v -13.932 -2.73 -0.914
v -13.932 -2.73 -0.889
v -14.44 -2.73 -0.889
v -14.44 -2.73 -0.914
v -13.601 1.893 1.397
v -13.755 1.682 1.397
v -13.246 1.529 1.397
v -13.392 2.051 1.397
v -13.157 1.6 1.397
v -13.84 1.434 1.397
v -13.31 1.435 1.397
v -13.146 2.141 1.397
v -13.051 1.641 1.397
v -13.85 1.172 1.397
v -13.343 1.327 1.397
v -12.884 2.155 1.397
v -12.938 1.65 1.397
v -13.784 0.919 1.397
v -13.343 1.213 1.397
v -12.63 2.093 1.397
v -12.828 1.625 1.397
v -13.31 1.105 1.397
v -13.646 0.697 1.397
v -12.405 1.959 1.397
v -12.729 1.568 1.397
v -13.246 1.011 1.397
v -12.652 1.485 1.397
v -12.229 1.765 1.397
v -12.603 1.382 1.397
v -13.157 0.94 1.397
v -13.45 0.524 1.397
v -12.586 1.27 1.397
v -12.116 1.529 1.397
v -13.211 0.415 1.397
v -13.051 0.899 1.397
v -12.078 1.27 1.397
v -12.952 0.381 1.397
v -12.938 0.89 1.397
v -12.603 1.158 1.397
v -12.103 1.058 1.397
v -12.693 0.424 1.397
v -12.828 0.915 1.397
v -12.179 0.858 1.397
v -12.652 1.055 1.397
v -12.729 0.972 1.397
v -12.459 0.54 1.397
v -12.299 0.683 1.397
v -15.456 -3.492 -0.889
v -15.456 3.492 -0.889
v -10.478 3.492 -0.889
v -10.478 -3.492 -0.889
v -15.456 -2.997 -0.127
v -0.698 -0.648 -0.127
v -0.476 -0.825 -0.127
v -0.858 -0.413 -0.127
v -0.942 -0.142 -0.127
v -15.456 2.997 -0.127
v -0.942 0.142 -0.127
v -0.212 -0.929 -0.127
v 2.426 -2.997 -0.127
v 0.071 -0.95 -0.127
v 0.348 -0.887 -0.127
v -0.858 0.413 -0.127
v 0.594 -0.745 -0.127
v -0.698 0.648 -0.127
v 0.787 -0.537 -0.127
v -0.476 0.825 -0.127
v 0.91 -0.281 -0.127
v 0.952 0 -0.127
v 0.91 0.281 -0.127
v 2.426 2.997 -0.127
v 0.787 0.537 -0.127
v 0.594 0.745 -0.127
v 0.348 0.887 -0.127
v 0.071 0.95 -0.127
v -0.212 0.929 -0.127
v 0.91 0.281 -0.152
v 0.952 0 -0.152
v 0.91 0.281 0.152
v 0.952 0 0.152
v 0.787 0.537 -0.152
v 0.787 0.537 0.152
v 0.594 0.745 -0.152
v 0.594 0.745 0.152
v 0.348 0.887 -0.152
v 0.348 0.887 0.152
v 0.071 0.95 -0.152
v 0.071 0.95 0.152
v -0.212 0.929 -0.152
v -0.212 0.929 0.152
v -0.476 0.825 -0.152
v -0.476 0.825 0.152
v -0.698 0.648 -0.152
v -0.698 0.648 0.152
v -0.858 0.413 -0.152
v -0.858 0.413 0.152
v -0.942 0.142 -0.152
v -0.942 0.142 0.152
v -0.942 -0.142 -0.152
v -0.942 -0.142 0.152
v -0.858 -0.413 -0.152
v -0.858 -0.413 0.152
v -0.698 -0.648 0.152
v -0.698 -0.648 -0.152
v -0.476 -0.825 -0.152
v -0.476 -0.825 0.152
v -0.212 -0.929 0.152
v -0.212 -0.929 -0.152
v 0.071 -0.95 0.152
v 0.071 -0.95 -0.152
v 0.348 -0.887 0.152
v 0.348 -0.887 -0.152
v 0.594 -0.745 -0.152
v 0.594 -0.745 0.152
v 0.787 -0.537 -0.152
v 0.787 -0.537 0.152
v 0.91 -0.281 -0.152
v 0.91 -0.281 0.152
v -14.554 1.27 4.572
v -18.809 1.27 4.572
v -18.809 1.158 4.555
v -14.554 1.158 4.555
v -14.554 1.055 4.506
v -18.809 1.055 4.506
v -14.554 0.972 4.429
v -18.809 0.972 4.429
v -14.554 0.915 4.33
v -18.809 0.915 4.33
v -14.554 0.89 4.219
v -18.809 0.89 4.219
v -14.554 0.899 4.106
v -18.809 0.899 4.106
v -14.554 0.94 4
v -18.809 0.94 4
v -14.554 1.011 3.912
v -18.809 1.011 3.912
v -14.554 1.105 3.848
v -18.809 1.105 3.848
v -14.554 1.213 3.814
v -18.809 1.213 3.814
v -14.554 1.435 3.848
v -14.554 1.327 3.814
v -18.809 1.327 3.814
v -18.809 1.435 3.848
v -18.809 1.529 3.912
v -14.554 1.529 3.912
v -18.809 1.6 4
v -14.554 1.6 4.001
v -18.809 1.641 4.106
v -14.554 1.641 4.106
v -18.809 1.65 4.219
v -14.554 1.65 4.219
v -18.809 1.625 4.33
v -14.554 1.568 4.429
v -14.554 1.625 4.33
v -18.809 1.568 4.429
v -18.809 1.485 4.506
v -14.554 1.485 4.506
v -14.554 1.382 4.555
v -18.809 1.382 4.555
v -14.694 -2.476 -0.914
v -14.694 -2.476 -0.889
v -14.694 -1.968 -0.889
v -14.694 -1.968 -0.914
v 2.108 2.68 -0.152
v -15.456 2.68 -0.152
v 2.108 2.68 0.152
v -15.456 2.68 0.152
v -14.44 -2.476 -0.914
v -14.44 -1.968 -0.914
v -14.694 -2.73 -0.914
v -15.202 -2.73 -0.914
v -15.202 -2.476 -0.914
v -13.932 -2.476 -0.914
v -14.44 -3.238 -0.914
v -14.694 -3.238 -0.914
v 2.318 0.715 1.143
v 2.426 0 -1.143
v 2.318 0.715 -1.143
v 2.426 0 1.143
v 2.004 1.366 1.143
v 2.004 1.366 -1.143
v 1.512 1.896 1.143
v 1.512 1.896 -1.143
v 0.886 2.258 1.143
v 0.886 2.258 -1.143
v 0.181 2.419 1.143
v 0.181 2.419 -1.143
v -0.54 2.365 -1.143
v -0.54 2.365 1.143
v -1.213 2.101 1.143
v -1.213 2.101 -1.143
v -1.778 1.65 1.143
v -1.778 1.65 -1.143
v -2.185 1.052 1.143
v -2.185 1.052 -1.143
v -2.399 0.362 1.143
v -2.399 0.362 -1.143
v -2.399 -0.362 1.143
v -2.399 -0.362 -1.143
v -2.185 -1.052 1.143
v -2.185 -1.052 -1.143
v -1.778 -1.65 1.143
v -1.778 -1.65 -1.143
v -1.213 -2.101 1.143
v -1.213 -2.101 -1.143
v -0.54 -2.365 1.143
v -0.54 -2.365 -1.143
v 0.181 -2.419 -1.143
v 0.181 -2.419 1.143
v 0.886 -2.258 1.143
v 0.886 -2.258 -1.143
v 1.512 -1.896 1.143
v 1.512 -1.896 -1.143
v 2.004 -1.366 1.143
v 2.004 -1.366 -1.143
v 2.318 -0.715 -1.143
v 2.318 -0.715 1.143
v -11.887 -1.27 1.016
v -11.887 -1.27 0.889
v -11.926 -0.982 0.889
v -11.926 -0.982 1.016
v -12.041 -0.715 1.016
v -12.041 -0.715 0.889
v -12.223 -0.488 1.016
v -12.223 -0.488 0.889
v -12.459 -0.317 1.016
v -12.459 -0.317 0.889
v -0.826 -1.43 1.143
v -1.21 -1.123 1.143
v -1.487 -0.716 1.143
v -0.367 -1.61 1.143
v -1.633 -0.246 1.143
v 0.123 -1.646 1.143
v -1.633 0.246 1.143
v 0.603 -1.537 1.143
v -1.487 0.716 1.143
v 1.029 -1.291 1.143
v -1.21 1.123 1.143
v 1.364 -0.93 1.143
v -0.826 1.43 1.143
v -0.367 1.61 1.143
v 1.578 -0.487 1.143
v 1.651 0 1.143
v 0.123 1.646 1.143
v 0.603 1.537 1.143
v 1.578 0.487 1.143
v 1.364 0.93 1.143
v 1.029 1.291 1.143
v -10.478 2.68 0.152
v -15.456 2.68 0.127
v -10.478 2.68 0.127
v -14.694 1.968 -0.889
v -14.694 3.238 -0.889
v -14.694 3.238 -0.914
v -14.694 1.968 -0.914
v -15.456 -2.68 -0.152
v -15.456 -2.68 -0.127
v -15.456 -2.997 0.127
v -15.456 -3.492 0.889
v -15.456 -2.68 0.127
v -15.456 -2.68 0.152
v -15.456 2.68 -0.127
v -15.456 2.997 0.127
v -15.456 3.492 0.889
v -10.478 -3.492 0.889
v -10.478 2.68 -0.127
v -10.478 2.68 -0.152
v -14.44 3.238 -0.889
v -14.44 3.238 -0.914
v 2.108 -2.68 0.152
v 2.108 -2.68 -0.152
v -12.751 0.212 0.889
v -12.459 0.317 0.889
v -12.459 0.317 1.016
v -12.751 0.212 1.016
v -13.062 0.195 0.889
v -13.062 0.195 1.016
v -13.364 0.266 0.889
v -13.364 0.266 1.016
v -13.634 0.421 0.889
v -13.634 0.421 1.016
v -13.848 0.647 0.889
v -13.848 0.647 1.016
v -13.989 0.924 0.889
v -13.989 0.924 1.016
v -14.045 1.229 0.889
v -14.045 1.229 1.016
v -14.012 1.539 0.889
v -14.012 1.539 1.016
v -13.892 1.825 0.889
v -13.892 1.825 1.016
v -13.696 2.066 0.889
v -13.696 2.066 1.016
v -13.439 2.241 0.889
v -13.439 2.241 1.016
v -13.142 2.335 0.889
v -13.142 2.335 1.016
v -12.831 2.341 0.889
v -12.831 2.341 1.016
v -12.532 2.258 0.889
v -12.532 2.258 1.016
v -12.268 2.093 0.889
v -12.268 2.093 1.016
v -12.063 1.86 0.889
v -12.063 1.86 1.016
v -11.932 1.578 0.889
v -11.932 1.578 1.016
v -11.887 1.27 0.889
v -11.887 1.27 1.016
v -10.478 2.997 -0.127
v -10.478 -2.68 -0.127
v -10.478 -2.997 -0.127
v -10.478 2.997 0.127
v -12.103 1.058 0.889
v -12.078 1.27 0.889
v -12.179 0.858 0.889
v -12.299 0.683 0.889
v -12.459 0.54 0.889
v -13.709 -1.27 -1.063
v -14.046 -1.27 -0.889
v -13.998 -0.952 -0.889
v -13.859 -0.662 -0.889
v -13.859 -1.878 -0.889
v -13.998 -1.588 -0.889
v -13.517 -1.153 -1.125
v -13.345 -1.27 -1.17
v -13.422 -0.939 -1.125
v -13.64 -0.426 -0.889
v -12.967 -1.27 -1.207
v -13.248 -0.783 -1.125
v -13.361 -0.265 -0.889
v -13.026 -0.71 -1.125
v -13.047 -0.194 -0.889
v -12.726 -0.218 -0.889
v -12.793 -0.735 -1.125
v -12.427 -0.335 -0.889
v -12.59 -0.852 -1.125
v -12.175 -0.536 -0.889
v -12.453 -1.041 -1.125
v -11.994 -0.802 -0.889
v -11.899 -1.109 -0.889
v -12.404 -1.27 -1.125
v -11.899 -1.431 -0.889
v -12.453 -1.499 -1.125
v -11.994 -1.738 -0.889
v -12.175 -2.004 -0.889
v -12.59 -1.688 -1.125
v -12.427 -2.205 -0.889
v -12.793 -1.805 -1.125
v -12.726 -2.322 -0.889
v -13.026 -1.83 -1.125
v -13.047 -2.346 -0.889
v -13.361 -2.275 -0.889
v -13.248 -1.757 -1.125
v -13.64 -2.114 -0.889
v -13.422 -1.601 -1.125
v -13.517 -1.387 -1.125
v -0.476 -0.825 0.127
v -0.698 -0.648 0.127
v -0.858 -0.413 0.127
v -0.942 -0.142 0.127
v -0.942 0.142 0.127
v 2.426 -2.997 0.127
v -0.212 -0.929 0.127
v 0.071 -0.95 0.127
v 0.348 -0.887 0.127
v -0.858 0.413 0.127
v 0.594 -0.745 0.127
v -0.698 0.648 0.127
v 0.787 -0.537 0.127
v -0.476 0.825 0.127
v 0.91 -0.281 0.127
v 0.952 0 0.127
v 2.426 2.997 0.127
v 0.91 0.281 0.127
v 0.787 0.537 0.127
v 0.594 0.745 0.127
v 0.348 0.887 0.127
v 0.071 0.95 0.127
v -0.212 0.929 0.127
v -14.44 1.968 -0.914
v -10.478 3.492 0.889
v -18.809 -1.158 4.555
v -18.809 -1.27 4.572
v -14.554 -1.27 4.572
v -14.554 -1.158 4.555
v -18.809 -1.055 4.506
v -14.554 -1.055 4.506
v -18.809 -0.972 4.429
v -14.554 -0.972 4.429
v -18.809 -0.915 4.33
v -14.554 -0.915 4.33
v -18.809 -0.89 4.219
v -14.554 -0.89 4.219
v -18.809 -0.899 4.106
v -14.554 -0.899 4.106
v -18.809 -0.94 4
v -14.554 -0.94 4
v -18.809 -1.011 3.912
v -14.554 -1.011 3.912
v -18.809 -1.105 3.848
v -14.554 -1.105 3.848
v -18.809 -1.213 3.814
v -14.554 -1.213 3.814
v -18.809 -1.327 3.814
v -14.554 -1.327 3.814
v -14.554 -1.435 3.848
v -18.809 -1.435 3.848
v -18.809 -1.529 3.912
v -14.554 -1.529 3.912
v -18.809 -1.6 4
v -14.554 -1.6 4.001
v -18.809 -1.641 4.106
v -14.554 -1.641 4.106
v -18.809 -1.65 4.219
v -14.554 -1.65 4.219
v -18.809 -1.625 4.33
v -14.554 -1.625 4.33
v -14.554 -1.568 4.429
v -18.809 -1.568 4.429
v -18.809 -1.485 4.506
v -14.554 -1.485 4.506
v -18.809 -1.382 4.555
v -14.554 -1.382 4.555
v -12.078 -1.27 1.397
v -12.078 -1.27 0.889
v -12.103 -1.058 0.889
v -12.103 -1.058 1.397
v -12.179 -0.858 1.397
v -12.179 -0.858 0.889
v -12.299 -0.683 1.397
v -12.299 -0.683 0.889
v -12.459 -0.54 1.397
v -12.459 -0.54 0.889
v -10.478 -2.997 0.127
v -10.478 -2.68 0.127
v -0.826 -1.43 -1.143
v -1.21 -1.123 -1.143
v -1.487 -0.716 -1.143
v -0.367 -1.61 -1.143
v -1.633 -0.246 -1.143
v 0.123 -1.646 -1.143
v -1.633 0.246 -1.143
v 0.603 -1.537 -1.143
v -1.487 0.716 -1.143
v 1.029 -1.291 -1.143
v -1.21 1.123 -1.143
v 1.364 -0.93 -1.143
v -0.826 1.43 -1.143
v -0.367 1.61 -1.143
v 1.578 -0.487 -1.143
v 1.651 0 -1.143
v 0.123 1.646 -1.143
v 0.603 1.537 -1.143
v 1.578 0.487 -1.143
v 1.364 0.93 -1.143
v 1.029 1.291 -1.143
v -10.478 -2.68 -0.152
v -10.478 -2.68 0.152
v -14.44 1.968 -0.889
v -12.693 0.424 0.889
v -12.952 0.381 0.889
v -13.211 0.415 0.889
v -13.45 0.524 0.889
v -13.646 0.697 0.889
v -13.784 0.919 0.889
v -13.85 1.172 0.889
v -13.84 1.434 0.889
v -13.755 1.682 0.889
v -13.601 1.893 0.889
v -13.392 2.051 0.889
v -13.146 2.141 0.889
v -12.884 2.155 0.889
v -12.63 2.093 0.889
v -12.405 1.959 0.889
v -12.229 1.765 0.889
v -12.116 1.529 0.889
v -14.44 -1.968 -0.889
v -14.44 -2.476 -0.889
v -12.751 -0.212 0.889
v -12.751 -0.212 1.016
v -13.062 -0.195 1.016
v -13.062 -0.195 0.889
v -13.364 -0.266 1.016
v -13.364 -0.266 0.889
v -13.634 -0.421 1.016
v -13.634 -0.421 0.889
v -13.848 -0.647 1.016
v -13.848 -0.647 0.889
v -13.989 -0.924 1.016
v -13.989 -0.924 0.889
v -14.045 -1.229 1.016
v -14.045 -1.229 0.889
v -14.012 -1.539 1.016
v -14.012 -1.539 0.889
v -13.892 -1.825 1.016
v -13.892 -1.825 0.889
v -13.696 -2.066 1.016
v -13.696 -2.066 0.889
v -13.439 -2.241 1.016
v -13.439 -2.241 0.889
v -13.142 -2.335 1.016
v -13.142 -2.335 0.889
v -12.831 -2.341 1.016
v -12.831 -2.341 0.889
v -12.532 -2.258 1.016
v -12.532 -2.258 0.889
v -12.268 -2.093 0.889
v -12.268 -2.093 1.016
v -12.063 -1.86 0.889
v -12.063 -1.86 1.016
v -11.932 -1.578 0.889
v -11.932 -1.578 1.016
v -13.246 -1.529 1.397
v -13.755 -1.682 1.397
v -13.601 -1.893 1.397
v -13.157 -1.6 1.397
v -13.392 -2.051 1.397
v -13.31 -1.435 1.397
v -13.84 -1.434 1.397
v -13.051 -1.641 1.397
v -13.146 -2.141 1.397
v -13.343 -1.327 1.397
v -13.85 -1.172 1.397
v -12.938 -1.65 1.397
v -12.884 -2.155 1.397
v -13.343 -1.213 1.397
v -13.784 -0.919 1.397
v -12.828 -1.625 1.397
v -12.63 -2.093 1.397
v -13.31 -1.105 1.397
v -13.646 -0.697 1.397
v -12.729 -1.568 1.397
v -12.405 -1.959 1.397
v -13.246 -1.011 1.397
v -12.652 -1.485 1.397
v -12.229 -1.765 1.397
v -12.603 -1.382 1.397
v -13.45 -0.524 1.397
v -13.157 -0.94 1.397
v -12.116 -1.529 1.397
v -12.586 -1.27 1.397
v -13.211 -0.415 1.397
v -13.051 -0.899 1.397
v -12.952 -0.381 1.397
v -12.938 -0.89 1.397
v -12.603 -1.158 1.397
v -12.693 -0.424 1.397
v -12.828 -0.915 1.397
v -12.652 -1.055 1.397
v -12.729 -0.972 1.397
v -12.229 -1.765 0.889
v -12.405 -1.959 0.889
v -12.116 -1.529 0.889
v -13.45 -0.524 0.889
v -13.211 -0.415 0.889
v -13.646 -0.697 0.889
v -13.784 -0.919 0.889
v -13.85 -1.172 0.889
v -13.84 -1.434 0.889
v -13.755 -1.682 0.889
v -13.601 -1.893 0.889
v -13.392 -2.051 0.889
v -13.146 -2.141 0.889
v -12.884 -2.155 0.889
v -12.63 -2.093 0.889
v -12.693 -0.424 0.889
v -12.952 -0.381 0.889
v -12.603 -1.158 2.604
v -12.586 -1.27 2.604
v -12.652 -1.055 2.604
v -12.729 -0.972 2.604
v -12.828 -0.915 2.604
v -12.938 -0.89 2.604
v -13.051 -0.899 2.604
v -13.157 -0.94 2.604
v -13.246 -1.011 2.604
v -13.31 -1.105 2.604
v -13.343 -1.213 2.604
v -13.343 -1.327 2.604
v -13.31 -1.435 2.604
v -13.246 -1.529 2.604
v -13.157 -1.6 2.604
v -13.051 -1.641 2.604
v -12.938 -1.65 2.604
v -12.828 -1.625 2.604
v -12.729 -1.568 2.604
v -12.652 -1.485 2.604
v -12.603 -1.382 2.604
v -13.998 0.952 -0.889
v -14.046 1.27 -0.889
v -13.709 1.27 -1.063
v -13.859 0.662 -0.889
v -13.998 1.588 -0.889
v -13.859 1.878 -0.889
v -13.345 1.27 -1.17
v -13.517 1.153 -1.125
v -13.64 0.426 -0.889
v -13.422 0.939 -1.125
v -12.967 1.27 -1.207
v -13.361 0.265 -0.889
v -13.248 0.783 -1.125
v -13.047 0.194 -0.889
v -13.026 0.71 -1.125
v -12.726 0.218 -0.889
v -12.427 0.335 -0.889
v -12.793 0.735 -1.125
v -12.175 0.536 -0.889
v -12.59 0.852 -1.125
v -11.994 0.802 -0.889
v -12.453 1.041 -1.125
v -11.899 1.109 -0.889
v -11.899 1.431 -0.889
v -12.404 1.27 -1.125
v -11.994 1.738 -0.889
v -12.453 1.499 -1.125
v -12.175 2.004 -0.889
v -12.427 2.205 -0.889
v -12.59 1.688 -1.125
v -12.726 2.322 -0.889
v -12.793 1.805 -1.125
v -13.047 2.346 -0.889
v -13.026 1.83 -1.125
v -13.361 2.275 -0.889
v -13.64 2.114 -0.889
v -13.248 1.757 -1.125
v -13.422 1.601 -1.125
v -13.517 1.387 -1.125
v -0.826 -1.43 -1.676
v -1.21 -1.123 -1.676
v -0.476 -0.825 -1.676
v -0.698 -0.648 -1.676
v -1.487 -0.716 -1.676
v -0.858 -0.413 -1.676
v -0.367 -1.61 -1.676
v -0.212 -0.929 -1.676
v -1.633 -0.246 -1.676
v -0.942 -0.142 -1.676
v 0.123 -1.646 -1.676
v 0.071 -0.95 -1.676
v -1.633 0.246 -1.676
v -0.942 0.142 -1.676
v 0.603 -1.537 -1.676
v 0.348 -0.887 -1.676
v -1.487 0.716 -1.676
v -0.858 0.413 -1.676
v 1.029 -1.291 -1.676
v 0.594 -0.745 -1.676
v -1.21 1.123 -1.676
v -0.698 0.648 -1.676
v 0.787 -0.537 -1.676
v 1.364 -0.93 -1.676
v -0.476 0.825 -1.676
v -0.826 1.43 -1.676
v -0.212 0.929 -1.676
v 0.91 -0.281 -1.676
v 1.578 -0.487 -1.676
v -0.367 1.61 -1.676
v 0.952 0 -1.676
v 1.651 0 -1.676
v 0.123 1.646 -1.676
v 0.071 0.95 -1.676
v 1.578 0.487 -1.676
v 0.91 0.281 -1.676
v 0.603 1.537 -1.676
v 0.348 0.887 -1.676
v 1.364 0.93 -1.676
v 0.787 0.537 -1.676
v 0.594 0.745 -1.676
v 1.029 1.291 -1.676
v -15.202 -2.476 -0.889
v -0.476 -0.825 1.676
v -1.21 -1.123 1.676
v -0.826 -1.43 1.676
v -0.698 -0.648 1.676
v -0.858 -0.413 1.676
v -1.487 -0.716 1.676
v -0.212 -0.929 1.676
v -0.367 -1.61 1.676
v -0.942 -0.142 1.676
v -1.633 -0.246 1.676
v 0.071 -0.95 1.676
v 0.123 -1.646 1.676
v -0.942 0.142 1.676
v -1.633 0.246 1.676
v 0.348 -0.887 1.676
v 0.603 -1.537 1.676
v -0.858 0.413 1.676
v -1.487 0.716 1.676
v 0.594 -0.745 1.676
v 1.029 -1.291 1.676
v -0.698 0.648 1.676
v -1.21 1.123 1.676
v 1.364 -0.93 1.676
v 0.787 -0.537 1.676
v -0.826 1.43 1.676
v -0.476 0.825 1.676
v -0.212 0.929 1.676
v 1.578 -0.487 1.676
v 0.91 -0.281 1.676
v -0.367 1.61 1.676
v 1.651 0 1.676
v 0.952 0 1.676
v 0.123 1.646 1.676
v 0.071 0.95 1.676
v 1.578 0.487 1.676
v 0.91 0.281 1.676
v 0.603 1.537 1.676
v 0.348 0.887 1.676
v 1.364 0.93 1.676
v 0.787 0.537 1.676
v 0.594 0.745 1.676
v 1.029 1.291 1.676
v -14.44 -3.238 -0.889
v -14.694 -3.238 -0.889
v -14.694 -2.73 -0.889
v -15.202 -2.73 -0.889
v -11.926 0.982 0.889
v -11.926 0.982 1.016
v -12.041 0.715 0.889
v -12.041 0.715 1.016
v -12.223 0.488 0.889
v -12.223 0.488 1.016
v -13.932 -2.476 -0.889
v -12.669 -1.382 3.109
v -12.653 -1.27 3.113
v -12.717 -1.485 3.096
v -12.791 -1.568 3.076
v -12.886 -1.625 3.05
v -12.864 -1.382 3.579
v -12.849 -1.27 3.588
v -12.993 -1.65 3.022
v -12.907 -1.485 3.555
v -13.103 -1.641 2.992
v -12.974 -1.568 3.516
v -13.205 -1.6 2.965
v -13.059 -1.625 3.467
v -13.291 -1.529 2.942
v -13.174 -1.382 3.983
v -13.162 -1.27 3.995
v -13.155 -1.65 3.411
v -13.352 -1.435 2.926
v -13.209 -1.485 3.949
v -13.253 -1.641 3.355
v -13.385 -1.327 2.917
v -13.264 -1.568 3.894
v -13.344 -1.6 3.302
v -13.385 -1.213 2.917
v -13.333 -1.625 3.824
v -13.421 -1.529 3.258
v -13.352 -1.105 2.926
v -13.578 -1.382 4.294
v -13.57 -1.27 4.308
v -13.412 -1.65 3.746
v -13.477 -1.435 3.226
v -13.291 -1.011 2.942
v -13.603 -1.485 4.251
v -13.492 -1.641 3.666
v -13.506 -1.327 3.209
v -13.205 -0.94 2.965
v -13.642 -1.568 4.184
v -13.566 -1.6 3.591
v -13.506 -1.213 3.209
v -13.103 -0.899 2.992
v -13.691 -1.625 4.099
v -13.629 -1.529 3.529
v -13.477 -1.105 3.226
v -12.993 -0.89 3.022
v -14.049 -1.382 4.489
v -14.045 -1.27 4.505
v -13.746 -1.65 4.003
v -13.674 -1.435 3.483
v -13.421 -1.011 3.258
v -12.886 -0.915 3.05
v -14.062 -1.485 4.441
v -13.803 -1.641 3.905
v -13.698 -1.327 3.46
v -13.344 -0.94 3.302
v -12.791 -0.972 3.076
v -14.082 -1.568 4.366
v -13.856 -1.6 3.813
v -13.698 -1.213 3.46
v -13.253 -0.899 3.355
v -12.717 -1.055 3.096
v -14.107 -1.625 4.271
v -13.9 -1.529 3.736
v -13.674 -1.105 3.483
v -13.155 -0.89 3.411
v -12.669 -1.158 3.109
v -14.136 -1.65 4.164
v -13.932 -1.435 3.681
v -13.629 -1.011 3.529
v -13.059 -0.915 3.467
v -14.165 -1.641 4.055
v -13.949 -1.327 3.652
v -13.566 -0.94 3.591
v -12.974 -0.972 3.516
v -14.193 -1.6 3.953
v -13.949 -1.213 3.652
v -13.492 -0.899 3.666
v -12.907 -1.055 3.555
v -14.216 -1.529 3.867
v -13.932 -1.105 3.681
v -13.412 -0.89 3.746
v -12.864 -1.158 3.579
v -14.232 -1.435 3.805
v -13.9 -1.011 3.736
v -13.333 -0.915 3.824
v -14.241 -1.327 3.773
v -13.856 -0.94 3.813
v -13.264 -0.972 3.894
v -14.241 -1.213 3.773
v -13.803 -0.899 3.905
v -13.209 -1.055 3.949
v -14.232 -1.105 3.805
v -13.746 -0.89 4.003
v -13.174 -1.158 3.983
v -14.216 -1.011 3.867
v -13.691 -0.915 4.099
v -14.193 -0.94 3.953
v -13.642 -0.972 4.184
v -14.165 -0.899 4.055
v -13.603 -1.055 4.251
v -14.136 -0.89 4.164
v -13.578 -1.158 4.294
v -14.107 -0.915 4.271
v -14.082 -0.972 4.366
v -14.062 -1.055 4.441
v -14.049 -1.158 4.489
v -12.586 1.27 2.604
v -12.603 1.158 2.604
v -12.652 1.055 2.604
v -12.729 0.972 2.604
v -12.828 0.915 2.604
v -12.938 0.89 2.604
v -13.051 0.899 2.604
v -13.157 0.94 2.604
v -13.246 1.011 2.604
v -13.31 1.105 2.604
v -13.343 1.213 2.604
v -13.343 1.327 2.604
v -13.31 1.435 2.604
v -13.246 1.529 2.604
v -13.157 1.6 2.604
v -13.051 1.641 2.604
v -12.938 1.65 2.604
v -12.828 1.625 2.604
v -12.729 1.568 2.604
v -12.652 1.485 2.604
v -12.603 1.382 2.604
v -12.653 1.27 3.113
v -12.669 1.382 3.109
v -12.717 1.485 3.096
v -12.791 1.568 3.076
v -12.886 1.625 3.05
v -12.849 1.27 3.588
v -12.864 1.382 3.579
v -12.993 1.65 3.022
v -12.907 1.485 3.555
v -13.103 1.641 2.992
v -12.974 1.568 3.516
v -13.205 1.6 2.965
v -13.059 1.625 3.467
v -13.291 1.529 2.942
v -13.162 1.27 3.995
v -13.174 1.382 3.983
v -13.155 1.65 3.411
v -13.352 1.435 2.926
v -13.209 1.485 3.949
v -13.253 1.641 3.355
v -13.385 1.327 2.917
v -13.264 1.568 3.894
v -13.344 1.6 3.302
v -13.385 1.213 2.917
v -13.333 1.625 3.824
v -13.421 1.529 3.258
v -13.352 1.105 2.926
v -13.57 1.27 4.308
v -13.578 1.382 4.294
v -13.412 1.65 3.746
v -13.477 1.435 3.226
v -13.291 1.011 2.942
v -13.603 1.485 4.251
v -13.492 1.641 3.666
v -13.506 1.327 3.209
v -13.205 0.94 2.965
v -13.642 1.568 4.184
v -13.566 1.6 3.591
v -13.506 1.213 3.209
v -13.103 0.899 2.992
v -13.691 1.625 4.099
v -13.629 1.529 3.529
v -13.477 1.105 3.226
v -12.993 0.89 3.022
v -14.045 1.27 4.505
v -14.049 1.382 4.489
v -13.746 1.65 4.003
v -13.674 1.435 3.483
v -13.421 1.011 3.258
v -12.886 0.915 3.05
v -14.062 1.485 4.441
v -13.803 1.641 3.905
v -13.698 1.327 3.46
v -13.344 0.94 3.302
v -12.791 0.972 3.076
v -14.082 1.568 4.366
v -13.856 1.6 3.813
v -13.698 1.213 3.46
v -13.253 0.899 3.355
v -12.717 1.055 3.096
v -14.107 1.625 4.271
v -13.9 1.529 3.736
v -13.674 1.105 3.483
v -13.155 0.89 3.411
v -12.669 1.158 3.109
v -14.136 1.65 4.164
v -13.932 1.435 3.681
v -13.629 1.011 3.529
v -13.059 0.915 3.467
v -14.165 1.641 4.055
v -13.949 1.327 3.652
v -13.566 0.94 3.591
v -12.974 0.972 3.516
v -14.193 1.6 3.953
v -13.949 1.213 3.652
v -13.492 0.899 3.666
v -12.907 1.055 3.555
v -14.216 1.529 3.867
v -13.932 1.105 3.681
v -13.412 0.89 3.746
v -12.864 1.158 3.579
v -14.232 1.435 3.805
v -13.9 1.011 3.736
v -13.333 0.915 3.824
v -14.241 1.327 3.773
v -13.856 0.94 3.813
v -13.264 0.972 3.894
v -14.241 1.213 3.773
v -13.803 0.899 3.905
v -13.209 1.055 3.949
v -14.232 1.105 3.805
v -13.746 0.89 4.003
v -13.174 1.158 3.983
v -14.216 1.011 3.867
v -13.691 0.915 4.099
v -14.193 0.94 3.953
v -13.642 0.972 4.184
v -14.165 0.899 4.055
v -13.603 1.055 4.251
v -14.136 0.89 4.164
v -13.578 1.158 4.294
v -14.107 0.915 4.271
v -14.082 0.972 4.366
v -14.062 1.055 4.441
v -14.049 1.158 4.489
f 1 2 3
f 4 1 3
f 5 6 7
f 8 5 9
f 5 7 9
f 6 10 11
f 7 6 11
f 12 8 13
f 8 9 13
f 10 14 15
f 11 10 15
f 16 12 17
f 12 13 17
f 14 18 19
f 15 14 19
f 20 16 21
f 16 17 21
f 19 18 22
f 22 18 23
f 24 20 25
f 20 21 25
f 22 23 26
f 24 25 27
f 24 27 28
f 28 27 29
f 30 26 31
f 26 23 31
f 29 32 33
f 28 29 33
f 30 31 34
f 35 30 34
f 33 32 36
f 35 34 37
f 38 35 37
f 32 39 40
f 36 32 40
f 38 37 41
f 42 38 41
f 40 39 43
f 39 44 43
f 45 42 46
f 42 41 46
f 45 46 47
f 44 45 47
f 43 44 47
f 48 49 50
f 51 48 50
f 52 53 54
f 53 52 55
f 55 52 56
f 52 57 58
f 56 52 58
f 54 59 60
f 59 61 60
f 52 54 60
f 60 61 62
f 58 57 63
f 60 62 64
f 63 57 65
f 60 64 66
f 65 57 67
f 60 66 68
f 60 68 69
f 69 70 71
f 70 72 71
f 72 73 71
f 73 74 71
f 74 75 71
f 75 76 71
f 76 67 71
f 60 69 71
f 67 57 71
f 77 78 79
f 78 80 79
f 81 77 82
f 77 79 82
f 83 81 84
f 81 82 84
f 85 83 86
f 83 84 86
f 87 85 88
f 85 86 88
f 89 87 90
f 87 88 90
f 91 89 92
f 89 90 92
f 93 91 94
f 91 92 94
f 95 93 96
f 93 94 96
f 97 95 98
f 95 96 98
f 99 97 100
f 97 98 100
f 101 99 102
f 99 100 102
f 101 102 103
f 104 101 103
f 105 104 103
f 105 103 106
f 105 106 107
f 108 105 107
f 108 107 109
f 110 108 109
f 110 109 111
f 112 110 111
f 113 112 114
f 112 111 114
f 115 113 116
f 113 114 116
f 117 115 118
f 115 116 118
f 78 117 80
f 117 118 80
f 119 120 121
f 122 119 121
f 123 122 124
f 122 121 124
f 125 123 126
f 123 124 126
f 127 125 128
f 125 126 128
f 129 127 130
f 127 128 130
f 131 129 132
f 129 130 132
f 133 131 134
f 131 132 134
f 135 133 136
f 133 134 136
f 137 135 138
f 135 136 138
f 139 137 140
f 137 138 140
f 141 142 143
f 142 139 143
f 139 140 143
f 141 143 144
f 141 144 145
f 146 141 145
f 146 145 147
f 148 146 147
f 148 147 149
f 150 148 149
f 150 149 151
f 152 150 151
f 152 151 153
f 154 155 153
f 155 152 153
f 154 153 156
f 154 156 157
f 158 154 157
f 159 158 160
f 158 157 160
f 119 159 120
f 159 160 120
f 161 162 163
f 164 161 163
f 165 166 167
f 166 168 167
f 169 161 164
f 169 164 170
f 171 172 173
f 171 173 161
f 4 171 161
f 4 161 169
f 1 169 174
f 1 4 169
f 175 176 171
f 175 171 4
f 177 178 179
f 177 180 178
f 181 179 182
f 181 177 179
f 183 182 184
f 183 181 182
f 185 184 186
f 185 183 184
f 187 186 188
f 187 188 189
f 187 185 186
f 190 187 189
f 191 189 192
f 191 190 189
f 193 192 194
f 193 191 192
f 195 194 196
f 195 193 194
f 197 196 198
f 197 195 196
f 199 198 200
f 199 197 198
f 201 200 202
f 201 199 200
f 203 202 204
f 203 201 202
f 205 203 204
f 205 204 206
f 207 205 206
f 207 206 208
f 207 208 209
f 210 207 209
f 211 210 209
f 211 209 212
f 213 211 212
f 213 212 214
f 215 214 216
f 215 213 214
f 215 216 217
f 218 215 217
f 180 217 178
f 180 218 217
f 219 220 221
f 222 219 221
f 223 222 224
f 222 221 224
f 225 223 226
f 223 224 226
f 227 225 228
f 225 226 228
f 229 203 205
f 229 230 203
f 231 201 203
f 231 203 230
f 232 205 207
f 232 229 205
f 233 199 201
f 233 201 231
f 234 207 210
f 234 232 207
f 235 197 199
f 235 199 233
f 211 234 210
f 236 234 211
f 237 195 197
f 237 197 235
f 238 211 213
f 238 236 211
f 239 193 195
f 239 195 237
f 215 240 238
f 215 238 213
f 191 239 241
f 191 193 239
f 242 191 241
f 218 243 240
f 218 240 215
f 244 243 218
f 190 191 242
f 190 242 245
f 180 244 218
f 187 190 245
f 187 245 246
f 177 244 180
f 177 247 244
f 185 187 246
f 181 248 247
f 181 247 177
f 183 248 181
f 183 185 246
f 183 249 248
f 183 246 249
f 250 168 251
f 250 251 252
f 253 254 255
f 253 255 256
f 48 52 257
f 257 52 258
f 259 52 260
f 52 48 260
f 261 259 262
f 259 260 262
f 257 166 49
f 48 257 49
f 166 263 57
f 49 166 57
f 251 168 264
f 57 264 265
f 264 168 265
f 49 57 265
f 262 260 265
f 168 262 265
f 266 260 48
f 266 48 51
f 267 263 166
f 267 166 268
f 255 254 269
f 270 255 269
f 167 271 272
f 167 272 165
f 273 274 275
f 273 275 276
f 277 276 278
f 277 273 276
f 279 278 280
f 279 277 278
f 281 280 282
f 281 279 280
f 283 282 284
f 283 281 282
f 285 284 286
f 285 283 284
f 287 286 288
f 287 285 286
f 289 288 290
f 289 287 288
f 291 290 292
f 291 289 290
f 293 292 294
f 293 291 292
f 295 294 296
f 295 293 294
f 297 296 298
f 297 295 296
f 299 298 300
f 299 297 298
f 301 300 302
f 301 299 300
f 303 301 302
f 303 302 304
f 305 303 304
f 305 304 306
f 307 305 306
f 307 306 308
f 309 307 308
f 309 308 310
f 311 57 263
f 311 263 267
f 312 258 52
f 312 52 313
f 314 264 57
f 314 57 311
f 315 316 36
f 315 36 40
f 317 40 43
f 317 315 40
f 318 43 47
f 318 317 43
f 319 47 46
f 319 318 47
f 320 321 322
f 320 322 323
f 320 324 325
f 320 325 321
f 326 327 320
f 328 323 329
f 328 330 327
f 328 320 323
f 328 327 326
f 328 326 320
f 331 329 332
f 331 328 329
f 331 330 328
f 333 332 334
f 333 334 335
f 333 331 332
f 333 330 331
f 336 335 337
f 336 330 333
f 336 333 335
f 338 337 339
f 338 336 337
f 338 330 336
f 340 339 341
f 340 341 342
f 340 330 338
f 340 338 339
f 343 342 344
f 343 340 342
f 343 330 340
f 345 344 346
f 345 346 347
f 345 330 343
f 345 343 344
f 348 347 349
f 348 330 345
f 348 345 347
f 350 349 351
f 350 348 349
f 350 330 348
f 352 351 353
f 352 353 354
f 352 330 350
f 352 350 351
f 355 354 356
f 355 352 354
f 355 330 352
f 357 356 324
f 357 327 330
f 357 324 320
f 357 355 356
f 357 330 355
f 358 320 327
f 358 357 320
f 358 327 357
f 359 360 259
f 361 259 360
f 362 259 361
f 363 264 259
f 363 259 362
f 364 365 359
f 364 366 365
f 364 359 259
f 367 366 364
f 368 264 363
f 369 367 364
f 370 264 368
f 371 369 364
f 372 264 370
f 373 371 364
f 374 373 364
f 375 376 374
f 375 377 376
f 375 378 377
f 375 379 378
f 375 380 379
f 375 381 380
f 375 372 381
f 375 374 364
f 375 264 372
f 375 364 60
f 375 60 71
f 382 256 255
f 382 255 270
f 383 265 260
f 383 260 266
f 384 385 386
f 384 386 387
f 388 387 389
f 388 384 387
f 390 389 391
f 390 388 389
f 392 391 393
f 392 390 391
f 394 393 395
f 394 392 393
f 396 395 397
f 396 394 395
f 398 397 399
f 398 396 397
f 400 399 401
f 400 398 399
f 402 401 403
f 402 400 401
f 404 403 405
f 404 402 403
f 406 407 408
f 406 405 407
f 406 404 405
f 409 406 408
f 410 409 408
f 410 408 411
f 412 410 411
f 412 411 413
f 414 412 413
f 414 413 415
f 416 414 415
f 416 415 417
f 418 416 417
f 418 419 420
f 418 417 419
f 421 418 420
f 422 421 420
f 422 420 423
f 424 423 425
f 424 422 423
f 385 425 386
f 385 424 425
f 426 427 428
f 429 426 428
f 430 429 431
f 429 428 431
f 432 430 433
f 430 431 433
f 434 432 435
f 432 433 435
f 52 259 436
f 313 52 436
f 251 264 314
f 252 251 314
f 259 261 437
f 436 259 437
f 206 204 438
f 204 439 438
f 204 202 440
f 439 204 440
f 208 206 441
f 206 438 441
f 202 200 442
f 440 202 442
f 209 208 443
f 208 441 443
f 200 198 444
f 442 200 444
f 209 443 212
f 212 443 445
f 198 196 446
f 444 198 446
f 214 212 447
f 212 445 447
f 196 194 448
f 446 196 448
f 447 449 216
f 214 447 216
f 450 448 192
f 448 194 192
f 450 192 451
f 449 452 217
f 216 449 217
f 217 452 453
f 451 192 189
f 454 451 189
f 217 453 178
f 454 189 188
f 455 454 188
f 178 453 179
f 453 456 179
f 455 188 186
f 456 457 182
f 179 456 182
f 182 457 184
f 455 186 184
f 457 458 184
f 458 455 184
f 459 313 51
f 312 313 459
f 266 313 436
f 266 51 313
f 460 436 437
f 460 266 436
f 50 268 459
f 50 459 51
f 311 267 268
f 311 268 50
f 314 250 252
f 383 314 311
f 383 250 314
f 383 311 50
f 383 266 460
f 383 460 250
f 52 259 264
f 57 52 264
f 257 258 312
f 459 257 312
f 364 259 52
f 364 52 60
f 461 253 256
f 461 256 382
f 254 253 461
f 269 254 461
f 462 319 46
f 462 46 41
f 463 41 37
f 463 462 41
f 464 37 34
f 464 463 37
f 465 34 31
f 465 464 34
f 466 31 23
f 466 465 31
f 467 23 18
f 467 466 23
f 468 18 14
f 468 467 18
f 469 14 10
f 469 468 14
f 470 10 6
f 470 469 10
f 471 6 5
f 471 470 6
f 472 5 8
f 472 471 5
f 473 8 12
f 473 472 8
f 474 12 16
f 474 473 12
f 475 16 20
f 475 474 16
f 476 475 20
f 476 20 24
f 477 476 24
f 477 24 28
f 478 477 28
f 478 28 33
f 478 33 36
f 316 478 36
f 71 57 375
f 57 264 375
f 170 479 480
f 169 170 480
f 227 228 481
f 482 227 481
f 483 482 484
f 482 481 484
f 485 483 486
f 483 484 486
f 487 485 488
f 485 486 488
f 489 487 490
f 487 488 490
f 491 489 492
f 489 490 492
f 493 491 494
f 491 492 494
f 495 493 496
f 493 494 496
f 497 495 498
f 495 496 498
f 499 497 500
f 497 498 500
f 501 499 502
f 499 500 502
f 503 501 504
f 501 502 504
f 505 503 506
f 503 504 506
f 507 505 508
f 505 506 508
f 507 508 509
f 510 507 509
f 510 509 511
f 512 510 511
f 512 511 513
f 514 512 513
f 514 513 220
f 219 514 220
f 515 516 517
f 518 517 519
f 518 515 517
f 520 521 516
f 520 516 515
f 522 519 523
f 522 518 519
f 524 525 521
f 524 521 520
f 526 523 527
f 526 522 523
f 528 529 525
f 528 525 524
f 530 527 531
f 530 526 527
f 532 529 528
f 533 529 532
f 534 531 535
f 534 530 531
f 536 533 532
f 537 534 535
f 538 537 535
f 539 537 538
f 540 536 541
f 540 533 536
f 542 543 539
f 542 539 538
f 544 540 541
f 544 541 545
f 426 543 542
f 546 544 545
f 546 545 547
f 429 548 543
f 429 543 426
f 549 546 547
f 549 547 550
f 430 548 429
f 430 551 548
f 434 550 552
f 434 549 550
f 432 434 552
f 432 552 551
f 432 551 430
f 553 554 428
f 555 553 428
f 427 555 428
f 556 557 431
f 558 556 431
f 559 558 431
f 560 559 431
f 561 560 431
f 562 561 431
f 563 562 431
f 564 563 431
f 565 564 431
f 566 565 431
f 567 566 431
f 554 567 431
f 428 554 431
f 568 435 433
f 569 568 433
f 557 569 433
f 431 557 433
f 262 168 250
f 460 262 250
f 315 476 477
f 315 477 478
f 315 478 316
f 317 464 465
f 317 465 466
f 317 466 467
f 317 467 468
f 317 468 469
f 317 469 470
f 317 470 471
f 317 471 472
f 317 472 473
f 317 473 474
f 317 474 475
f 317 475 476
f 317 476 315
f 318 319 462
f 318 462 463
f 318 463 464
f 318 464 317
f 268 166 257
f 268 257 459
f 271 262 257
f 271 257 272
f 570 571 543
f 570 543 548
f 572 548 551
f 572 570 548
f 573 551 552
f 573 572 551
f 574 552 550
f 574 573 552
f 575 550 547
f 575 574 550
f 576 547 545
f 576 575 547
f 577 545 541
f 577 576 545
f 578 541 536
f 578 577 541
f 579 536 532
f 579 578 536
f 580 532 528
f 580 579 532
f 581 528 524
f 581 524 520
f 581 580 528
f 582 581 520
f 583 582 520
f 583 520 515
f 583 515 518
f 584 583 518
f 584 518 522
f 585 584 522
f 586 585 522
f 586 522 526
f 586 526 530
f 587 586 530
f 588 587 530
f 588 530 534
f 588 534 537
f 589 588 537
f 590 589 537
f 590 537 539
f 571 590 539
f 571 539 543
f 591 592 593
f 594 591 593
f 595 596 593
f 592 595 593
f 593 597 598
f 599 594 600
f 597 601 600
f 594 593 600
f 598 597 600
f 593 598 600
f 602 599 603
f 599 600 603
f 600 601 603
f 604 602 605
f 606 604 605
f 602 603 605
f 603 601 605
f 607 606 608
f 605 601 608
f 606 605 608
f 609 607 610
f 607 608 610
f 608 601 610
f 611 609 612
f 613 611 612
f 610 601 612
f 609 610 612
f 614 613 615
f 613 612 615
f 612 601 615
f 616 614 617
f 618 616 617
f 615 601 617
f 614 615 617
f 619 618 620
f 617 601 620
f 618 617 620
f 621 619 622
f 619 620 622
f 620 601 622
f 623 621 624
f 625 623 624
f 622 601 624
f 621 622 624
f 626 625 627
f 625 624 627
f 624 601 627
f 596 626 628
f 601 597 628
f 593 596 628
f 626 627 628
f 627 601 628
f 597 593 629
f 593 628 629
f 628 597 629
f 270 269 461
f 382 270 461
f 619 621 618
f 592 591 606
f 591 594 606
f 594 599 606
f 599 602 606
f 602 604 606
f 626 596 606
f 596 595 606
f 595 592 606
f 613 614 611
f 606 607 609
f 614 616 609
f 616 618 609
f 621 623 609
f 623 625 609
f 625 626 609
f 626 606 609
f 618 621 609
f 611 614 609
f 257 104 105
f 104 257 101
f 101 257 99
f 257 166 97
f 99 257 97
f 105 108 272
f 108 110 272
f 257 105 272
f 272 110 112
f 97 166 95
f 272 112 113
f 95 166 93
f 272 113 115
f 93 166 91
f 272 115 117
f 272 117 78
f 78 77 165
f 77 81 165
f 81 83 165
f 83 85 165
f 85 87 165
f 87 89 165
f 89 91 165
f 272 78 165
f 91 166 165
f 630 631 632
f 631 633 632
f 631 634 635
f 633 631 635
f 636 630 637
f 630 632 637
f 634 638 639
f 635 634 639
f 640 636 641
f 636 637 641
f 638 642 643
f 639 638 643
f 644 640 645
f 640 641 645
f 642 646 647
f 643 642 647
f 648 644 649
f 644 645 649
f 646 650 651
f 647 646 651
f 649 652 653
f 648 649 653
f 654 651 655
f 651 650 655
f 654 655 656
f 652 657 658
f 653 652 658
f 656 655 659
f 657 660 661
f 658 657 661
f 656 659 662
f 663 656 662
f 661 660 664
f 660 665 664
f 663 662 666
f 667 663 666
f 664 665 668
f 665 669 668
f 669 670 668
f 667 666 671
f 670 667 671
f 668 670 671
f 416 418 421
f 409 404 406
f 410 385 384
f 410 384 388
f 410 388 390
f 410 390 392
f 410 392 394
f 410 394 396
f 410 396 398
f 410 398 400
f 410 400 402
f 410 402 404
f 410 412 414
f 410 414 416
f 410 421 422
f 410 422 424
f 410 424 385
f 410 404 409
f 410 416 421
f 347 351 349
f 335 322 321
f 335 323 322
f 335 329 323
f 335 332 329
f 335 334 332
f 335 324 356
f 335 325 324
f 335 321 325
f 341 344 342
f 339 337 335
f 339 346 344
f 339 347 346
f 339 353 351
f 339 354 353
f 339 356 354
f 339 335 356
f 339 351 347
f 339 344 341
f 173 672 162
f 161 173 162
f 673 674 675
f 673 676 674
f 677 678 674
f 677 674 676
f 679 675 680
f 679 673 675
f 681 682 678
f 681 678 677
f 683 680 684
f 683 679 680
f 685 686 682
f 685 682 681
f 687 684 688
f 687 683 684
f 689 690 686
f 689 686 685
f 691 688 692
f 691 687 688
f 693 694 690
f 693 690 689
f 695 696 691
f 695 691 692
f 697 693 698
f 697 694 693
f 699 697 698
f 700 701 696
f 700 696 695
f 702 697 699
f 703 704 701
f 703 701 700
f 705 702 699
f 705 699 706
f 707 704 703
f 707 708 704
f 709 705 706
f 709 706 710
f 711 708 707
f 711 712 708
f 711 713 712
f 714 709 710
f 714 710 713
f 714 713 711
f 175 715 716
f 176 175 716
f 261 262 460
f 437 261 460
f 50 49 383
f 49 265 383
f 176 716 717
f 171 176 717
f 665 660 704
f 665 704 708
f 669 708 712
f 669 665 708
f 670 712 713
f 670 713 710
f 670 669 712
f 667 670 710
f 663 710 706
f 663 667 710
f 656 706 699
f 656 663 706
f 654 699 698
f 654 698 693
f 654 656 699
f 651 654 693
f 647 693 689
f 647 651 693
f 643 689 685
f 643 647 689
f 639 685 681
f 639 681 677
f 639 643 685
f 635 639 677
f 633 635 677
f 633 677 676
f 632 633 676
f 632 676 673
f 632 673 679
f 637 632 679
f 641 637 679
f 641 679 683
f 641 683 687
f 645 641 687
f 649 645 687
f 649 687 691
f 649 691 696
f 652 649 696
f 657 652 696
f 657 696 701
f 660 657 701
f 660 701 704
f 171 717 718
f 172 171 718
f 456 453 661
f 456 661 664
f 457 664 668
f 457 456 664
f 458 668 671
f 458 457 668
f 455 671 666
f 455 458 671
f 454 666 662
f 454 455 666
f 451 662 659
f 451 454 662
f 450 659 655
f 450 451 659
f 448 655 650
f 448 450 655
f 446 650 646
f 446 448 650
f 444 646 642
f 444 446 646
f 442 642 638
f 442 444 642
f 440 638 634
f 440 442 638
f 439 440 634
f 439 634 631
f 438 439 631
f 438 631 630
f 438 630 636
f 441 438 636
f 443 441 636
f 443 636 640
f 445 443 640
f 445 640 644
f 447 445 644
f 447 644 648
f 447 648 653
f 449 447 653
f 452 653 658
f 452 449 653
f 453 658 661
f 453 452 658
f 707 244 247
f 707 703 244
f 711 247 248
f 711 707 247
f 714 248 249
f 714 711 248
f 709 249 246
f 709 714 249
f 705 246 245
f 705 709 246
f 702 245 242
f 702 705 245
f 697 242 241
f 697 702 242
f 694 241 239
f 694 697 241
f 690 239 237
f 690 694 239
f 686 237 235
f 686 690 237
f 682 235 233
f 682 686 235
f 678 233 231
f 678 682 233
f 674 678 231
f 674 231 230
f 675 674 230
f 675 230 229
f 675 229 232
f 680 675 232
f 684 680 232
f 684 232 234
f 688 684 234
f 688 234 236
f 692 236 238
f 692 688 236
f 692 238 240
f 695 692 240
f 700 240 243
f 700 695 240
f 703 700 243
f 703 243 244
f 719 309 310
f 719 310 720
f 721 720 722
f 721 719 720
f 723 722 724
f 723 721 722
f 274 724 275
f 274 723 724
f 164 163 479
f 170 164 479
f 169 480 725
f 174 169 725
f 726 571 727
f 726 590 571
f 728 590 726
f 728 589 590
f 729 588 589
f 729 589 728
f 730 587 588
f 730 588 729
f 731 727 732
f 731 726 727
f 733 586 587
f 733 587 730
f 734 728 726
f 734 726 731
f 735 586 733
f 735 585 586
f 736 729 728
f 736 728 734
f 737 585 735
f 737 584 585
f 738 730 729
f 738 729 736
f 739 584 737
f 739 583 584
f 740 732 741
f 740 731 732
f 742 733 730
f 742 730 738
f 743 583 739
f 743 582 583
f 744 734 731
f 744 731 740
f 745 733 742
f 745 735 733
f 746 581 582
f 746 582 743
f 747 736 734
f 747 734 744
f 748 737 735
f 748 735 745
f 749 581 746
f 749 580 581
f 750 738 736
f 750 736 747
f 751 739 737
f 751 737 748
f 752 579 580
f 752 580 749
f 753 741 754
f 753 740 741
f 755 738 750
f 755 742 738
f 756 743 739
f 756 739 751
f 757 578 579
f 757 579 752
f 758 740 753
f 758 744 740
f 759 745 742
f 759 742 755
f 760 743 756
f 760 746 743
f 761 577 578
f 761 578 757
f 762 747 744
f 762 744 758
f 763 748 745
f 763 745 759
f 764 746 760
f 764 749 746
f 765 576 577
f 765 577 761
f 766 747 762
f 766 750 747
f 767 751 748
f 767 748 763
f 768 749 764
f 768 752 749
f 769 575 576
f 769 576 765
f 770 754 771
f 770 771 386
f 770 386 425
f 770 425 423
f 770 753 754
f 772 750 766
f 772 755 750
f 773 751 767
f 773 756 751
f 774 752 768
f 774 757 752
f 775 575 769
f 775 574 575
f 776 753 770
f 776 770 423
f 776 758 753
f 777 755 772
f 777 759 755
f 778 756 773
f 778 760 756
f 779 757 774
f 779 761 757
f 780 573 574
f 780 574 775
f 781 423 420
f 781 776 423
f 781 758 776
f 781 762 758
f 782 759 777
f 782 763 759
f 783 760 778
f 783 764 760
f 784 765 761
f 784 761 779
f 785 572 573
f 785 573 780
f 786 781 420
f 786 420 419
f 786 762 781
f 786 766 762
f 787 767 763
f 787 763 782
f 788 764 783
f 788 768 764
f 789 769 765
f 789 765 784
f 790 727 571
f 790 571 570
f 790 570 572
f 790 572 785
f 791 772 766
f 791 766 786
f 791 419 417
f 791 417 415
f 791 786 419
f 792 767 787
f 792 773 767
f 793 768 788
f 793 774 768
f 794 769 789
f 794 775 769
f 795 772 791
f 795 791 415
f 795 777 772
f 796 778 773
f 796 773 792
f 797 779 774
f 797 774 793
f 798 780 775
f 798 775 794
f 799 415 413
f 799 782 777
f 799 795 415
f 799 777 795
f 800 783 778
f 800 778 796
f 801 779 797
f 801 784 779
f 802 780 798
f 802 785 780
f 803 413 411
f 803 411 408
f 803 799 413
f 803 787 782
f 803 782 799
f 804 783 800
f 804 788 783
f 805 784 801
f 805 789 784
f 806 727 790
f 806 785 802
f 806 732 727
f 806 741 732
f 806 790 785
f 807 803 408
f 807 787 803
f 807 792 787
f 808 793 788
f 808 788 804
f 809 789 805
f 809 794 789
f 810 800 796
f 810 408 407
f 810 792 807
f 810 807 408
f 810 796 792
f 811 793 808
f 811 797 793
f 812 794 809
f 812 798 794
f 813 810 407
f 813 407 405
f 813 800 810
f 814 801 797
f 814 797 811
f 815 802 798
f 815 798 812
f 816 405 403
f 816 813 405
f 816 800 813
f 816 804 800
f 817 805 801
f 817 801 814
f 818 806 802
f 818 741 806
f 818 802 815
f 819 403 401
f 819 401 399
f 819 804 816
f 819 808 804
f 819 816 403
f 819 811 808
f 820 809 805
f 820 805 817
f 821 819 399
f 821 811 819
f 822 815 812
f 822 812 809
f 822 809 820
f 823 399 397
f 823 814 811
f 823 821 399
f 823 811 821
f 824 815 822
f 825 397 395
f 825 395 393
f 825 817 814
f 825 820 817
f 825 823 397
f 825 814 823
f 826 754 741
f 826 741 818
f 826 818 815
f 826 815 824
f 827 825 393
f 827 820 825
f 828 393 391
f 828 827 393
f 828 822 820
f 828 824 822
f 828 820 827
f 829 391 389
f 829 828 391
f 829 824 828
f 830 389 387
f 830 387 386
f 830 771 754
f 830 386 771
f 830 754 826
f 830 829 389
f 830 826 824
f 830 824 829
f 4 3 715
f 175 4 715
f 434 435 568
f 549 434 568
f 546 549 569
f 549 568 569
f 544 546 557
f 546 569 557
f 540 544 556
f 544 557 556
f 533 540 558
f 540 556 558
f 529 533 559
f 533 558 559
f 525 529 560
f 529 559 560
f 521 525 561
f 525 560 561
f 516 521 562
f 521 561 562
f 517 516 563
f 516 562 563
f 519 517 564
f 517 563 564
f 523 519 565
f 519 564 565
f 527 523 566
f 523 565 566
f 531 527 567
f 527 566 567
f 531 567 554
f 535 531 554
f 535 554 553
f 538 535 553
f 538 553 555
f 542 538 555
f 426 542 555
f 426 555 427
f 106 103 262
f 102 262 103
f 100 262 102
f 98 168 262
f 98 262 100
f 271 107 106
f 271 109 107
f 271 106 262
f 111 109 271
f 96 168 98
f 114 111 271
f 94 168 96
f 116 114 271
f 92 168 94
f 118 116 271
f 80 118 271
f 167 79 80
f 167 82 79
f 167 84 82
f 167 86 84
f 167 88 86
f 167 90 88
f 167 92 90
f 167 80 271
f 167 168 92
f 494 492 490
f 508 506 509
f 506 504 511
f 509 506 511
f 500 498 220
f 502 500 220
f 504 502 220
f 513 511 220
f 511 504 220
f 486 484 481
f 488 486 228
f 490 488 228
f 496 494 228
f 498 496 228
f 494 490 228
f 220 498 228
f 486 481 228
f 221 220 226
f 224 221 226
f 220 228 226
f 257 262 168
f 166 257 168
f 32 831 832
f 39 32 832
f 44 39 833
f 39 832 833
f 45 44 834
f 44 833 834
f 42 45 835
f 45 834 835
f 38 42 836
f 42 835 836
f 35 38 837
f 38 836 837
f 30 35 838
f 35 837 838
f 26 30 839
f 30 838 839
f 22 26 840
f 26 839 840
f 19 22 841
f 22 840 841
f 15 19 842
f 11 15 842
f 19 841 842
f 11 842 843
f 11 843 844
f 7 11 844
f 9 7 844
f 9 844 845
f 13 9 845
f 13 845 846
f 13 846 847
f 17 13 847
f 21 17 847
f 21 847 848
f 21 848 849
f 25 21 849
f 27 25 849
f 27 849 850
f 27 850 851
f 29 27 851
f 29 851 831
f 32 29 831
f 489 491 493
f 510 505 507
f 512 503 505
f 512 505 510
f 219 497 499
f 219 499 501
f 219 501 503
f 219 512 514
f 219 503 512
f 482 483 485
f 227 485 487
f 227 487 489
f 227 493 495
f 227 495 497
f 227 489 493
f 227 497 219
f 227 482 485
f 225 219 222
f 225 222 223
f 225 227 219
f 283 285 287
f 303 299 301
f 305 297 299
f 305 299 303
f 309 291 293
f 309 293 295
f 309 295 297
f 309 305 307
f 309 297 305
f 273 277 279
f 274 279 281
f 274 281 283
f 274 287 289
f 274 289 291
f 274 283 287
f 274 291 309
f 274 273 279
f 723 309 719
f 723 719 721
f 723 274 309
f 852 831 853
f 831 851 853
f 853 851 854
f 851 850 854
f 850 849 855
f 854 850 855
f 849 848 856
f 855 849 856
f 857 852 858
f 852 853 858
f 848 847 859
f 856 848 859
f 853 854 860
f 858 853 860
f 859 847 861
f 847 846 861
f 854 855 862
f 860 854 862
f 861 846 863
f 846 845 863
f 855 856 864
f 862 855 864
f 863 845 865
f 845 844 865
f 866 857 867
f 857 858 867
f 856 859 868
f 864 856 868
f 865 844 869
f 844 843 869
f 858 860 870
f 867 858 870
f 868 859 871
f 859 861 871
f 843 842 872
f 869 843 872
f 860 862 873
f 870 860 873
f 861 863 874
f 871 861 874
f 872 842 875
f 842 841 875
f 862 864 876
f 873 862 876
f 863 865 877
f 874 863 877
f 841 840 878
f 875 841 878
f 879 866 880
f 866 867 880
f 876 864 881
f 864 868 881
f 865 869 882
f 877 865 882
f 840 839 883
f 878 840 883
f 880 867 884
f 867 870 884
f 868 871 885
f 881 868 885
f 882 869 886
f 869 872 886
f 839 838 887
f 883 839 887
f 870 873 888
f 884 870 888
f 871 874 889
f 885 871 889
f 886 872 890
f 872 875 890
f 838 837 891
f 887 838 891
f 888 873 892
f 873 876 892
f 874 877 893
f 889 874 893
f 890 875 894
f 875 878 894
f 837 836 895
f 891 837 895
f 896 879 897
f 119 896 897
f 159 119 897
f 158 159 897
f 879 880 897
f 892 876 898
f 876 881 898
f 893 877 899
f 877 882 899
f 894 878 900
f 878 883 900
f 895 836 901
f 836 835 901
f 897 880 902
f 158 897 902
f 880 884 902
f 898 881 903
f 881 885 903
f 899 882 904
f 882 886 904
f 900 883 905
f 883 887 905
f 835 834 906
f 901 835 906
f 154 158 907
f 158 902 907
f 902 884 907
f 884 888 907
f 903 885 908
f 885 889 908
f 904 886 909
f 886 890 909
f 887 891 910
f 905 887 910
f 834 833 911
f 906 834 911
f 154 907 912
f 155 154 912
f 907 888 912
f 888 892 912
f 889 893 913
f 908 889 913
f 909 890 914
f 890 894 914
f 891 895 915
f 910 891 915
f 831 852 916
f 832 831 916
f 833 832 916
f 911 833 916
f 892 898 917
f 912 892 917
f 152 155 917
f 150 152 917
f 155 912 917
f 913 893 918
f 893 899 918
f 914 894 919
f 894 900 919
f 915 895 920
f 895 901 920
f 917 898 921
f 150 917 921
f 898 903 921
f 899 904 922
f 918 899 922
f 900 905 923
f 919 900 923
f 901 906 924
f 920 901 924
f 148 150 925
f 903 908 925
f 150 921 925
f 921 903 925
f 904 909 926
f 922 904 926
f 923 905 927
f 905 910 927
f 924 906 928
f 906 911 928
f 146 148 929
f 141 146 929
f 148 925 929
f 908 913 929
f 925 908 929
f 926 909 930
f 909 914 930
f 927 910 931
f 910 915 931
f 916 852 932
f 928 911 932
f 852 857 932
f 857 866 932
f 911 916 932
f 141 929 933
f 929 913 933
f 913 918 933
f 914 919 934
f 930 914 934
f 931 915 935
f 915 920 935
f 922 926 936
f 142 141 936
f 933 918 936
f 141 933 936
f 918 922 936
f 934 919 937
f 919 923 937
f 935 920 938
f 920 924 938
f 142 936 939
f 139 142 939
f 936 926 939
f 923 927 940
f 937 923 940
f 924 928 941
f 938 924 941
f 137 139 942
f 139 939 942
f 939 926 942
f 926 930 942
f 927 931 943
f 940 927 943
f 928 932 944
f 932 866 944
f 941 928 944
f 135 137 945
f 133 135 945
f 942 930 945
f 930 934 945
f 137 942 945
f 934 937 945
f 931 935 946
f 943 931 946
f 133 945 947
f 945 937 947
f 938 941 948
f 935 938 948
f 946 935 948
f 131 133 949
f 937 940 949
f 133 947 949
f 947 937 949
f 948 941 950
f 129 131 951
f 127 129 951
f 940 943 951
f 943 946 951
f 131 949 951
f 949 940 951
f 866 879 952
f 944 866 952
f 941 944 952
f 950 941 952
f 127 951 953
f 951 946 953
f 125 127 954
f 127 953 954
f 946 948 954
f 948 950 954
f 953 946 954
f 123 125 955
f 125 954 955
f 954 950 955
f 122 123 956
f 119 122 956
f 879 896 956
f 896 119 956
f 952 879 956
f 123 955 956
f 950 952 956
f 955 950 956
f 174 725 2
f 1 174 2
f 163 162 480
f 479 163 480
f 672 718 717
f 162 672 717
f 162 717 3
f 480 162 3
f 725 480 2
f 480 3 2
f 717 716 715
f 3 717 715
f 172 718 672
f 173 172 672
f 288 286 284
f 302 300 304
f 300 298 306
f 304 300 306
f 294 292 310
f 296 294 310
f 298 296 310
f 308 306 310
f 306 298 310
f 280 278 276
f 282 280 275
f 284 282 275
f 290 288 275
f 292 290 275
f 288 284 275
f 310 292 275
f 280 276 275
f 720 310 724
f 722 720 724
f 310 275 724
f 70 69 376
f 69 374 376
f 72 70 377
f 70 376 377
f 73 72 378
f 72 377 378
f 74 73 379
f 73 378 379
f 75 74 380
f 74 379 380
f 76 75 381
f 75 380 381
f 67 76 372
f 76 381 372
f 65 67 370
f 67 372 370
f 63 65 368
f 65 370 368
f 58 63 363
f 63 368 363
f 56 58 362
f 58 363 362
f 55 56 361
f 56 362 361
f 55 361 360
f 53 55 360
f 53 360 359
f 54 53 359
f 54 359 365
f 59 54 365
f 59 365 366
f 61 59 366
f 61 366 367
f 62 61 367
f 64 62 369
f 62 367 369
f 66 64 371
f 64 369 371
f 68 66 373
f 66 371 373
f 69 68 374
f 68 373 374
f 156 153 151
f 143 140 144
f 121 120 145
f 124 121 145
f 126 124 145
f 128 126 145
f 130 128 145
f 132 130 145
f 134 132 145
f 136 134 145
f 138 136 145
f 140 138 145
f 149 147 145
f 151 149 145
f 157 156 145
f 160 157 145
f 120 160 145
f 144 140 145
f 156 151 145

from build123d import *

# Parameters (mm, degrees)
F0_R          = 2.4257
F0_R_2        = 1.651
F0_R_3        = 0.9525
F1_DEPTH      = 1.143
F1_DEPTH_BACK = 1.143
F2_DEPTH      = 1.6764
F3_W          = 17.8816
F3_H          = 5.9944
F4_DEPTH      = 0.127
F5_W          = 17.5641
F5_H          = 5.3594
F6_DEPTH      = 0.1524
F7_DEPTH      = 12.7
F8_W          = 4.9784
F8_H          = 6.985
F9_DEPTH      = 0.889
F16_R         = 0.508
F17_DEPTH     = 0.127
F19_DEPTH     = 0.508
F23_R         = 0.381
F26_W         = 0.254
F26_H         = 1.27
F27_DEPTH     = 0.0254


with BuildPart() as f1:
    # F0 (on Top) → F1 (new body, two sides)
    with BuildSketch(Plane.XY) as f1_sk:
        Circle(F0_R)
        Circle(F0_R_2, mode=Mode.SUBTRACT)
        Circle(F0_R_2)
        Circle(F0_R_3, mode=Mode.SUBTRACT)
    extrude(amount=F1_DEPTH)
    extrude(f1_sk.sketch, amount=-F1_DEPTH_BACK)

    # F0 (on Top) → F2 (join, symmetric)
    with BuildSketch(Plane.XY):
        Circle(F0_R_2)
        Circle(F0_R_3, mode=Mode.SUBTRACT)
    extrude(amount=F2_DEPTH, both=True)


with BuildPart() as f4:
    # F3 (on Top) → F4 (new body, symmetric)
    with BuildSketch(Plane.XY):
        with Locations((-6.5151, 0)):
            Rectangle(F3_W, F3_H)
    extrude(amount=F4_DEPTH, both=True)


with BuildPart() as f6:
    # F5 (on Top) → F6 (new body, symmetric)
    with BuildSketch(Plane.XY):
        with Locations((-6.67385, 0)):
            Rectangle(F5_W, F5_H)
    extrude(amount=F6_DEPTH, both=True)


with BuildPart() as f7_tool:
    # F0 (on Top) → F7 (new body, symmetric)
    with BuildSketch(Plane.XY):
        Circle(F0_R_3)
    extrude(amount=F7_DEPTH, both=True)


with BuildPart() as f4_1:
    add(f4.part)

    # F7: cut by f7_tool
    add(f7_tool.part, mode=Mode.SUBTRACT)


with BuildPart() as f6_1:
    add(f6.part)

    # F7: cut by f7_tool
    add(f7_tool.part, mode=Mode.SUBTRACT)


with BuildPart() as f9:
    # F8 (on Top) → F9 (new body, symmetric)
    with BuildSketch(Plane.XY):
        with Locations((-12.9667, 0)):
            Rectangle(F8_W, F8_H)
    extrude(amount=F9_DEPTH, both=True)

    # F10: cut F4, F6
    add(f4_1.part, mode=Mode.SUBTRACT)
    add(f6_1.part, mode=Mode.SUBTRACT)


with BuildPart() as f14:
    # F13 (on offset) → F14 (revolve)
    with BuildSketch(Plane.XZ.offset(1.27)):
        with BuildLine():
            Line((-12.9667, -1.2065), (-12.9667, -0.889))
            Line((-12.9667, -0.889), (-14.0462, -0.889))
            ThreePointArc((-14.0462, -0.889), (-13.529311, -1.125479), (-12.9667, -1.2065))
        make_face()
    revolve(axis=Axis((-12.9667, -1.27, -1.04775), (0, 0, -1)))


with BuildPart() as f15_1:
    # F15: instance of F14
    add(f14.part.mirror(Plane.XZ))


with BuildPart() as f17:
    # F16 (on face) → F17 (new body)
    with BuildSketch(Plane.XY.offset(0.889)):
        with BuildLine():
            ThreePointArc((-12.4587, -0.3175), (-13.892364, -1.825398), (-11.8872, -1.27))
            ThreePointArc((-11.8872, -1.27), (-12.041036, -0.714602), (-12.4587, -0.3175))
        make_face()
        with BuildLine():
            ThreePointArc((-12.0777, -1.27), (-13.754714, -1.681527), (-12.4587, -0.540441))
            ThreePointArc((-12.4587, -0.540441), (-12.178686, -0.858473), (-12.0777, -1.27))
        make_face(mode=Mode.SUBTRACT)
        with BuildLine():
            ThreePointArc((-12.0777, -1.27), (-12.178686, -0.858473), (-12.4587, -0.540441))
            ThreePointArc((-12.4587, -0.540441), (-13.754714, -1.681527), (-12.0777, -1.27))
        make_face()
        with Locations((-12.9667, -1.27)):
            Circle(F16_R, mode=Mode.SUBTRACT)
        with Locations((-12.9667, -1.27)):
            Circle(F16_R)
    extrude(amount=F17_DEPTH)


with BuildPart() as f18_1:
    # F18: instance of F17
    add(f17.part.mirror(Plane.XZ))


with BuildPart() as f19:
    # F16 (on face) → F19 (new body)
    with BuildSketch(Plane.XY.offset(0.889)):
        with BuildLine():
            ThreePointArc((-12.0777, -1.27), (-12.178686, -0.858473), (-12.4587, -0.540441))
            ThreePointArc((-12.4587, -0.540441), (-13.754714, -1.681527), (-12.0777, -1.27))
        make_face()
        with Locations((-12.9667, -1.27)):
            Circle(F16_R, mode=Mode.SUBTRACT)
        with Locations((-12.9667, -1.27)):
            Circle(F16_R)
    extrude(amount=F19_DEPTH)

    # F24: sweep along a path in F22
    with BuildLine(Plane(origin=(0, -1.27, 0), x_dir=(-1, 0, 0), z_dir=(0, 1, 0))) as f24_path:
        Line((12.9667, 1.397), (12.9667, 2.6035))
        ThreePointArc((12.9667, 2.6035), (13.431668, 3.726032), (14.5542, 4.191))
        Line((14.5542, 4.191), (18.8087, 4.191))
    # F23 (on face) → F24 (sweep)
    with BuildSketch(Plane.XY.offset(1.397)):
        with Locations((-12.9667, -1.27)):
            Circle(F23_R)
    sweep(path=f24_path.line)


with BuildPart() as f25_1:
    # F25: instance of F19
    add(f19.part.mirror(Plane.XZ))


with BuildPart() as f27:
    # F26 (on face) → F27 (new body)
    with BuildSketch(Plane(origin=(0, 0, -0.889), x_dir=(1, 0, 0), z_dir=(0, 0, -1))):
        Polygon((-14.4399, 3.2385), (-14.6939, 3.2385), (-14.6939, 2.7305), (-15.2019, 2.7305), (-15.2019, 2.4765), (-14.6939, 2.4765), (-14.6939, 1.9685), (-14.4399, 1.9685), (-14.4399, 2.4765), (-13.9319, 2.4765), (-13.9319, 2.7305), (-14.4399, 2.7305), align=None)
        with Locations((-14.5669, -2.6035)):
            Rectangle(F26_W, F26_H)
    extrude(amount=F27_DEPTH)


solid = Compound([f1.part, f4_1.part, f6_1.part, f9.part, f14.part, f15_1.part, f17.part, f18_1.part, f19.part, f25_1.part, f27.part])
